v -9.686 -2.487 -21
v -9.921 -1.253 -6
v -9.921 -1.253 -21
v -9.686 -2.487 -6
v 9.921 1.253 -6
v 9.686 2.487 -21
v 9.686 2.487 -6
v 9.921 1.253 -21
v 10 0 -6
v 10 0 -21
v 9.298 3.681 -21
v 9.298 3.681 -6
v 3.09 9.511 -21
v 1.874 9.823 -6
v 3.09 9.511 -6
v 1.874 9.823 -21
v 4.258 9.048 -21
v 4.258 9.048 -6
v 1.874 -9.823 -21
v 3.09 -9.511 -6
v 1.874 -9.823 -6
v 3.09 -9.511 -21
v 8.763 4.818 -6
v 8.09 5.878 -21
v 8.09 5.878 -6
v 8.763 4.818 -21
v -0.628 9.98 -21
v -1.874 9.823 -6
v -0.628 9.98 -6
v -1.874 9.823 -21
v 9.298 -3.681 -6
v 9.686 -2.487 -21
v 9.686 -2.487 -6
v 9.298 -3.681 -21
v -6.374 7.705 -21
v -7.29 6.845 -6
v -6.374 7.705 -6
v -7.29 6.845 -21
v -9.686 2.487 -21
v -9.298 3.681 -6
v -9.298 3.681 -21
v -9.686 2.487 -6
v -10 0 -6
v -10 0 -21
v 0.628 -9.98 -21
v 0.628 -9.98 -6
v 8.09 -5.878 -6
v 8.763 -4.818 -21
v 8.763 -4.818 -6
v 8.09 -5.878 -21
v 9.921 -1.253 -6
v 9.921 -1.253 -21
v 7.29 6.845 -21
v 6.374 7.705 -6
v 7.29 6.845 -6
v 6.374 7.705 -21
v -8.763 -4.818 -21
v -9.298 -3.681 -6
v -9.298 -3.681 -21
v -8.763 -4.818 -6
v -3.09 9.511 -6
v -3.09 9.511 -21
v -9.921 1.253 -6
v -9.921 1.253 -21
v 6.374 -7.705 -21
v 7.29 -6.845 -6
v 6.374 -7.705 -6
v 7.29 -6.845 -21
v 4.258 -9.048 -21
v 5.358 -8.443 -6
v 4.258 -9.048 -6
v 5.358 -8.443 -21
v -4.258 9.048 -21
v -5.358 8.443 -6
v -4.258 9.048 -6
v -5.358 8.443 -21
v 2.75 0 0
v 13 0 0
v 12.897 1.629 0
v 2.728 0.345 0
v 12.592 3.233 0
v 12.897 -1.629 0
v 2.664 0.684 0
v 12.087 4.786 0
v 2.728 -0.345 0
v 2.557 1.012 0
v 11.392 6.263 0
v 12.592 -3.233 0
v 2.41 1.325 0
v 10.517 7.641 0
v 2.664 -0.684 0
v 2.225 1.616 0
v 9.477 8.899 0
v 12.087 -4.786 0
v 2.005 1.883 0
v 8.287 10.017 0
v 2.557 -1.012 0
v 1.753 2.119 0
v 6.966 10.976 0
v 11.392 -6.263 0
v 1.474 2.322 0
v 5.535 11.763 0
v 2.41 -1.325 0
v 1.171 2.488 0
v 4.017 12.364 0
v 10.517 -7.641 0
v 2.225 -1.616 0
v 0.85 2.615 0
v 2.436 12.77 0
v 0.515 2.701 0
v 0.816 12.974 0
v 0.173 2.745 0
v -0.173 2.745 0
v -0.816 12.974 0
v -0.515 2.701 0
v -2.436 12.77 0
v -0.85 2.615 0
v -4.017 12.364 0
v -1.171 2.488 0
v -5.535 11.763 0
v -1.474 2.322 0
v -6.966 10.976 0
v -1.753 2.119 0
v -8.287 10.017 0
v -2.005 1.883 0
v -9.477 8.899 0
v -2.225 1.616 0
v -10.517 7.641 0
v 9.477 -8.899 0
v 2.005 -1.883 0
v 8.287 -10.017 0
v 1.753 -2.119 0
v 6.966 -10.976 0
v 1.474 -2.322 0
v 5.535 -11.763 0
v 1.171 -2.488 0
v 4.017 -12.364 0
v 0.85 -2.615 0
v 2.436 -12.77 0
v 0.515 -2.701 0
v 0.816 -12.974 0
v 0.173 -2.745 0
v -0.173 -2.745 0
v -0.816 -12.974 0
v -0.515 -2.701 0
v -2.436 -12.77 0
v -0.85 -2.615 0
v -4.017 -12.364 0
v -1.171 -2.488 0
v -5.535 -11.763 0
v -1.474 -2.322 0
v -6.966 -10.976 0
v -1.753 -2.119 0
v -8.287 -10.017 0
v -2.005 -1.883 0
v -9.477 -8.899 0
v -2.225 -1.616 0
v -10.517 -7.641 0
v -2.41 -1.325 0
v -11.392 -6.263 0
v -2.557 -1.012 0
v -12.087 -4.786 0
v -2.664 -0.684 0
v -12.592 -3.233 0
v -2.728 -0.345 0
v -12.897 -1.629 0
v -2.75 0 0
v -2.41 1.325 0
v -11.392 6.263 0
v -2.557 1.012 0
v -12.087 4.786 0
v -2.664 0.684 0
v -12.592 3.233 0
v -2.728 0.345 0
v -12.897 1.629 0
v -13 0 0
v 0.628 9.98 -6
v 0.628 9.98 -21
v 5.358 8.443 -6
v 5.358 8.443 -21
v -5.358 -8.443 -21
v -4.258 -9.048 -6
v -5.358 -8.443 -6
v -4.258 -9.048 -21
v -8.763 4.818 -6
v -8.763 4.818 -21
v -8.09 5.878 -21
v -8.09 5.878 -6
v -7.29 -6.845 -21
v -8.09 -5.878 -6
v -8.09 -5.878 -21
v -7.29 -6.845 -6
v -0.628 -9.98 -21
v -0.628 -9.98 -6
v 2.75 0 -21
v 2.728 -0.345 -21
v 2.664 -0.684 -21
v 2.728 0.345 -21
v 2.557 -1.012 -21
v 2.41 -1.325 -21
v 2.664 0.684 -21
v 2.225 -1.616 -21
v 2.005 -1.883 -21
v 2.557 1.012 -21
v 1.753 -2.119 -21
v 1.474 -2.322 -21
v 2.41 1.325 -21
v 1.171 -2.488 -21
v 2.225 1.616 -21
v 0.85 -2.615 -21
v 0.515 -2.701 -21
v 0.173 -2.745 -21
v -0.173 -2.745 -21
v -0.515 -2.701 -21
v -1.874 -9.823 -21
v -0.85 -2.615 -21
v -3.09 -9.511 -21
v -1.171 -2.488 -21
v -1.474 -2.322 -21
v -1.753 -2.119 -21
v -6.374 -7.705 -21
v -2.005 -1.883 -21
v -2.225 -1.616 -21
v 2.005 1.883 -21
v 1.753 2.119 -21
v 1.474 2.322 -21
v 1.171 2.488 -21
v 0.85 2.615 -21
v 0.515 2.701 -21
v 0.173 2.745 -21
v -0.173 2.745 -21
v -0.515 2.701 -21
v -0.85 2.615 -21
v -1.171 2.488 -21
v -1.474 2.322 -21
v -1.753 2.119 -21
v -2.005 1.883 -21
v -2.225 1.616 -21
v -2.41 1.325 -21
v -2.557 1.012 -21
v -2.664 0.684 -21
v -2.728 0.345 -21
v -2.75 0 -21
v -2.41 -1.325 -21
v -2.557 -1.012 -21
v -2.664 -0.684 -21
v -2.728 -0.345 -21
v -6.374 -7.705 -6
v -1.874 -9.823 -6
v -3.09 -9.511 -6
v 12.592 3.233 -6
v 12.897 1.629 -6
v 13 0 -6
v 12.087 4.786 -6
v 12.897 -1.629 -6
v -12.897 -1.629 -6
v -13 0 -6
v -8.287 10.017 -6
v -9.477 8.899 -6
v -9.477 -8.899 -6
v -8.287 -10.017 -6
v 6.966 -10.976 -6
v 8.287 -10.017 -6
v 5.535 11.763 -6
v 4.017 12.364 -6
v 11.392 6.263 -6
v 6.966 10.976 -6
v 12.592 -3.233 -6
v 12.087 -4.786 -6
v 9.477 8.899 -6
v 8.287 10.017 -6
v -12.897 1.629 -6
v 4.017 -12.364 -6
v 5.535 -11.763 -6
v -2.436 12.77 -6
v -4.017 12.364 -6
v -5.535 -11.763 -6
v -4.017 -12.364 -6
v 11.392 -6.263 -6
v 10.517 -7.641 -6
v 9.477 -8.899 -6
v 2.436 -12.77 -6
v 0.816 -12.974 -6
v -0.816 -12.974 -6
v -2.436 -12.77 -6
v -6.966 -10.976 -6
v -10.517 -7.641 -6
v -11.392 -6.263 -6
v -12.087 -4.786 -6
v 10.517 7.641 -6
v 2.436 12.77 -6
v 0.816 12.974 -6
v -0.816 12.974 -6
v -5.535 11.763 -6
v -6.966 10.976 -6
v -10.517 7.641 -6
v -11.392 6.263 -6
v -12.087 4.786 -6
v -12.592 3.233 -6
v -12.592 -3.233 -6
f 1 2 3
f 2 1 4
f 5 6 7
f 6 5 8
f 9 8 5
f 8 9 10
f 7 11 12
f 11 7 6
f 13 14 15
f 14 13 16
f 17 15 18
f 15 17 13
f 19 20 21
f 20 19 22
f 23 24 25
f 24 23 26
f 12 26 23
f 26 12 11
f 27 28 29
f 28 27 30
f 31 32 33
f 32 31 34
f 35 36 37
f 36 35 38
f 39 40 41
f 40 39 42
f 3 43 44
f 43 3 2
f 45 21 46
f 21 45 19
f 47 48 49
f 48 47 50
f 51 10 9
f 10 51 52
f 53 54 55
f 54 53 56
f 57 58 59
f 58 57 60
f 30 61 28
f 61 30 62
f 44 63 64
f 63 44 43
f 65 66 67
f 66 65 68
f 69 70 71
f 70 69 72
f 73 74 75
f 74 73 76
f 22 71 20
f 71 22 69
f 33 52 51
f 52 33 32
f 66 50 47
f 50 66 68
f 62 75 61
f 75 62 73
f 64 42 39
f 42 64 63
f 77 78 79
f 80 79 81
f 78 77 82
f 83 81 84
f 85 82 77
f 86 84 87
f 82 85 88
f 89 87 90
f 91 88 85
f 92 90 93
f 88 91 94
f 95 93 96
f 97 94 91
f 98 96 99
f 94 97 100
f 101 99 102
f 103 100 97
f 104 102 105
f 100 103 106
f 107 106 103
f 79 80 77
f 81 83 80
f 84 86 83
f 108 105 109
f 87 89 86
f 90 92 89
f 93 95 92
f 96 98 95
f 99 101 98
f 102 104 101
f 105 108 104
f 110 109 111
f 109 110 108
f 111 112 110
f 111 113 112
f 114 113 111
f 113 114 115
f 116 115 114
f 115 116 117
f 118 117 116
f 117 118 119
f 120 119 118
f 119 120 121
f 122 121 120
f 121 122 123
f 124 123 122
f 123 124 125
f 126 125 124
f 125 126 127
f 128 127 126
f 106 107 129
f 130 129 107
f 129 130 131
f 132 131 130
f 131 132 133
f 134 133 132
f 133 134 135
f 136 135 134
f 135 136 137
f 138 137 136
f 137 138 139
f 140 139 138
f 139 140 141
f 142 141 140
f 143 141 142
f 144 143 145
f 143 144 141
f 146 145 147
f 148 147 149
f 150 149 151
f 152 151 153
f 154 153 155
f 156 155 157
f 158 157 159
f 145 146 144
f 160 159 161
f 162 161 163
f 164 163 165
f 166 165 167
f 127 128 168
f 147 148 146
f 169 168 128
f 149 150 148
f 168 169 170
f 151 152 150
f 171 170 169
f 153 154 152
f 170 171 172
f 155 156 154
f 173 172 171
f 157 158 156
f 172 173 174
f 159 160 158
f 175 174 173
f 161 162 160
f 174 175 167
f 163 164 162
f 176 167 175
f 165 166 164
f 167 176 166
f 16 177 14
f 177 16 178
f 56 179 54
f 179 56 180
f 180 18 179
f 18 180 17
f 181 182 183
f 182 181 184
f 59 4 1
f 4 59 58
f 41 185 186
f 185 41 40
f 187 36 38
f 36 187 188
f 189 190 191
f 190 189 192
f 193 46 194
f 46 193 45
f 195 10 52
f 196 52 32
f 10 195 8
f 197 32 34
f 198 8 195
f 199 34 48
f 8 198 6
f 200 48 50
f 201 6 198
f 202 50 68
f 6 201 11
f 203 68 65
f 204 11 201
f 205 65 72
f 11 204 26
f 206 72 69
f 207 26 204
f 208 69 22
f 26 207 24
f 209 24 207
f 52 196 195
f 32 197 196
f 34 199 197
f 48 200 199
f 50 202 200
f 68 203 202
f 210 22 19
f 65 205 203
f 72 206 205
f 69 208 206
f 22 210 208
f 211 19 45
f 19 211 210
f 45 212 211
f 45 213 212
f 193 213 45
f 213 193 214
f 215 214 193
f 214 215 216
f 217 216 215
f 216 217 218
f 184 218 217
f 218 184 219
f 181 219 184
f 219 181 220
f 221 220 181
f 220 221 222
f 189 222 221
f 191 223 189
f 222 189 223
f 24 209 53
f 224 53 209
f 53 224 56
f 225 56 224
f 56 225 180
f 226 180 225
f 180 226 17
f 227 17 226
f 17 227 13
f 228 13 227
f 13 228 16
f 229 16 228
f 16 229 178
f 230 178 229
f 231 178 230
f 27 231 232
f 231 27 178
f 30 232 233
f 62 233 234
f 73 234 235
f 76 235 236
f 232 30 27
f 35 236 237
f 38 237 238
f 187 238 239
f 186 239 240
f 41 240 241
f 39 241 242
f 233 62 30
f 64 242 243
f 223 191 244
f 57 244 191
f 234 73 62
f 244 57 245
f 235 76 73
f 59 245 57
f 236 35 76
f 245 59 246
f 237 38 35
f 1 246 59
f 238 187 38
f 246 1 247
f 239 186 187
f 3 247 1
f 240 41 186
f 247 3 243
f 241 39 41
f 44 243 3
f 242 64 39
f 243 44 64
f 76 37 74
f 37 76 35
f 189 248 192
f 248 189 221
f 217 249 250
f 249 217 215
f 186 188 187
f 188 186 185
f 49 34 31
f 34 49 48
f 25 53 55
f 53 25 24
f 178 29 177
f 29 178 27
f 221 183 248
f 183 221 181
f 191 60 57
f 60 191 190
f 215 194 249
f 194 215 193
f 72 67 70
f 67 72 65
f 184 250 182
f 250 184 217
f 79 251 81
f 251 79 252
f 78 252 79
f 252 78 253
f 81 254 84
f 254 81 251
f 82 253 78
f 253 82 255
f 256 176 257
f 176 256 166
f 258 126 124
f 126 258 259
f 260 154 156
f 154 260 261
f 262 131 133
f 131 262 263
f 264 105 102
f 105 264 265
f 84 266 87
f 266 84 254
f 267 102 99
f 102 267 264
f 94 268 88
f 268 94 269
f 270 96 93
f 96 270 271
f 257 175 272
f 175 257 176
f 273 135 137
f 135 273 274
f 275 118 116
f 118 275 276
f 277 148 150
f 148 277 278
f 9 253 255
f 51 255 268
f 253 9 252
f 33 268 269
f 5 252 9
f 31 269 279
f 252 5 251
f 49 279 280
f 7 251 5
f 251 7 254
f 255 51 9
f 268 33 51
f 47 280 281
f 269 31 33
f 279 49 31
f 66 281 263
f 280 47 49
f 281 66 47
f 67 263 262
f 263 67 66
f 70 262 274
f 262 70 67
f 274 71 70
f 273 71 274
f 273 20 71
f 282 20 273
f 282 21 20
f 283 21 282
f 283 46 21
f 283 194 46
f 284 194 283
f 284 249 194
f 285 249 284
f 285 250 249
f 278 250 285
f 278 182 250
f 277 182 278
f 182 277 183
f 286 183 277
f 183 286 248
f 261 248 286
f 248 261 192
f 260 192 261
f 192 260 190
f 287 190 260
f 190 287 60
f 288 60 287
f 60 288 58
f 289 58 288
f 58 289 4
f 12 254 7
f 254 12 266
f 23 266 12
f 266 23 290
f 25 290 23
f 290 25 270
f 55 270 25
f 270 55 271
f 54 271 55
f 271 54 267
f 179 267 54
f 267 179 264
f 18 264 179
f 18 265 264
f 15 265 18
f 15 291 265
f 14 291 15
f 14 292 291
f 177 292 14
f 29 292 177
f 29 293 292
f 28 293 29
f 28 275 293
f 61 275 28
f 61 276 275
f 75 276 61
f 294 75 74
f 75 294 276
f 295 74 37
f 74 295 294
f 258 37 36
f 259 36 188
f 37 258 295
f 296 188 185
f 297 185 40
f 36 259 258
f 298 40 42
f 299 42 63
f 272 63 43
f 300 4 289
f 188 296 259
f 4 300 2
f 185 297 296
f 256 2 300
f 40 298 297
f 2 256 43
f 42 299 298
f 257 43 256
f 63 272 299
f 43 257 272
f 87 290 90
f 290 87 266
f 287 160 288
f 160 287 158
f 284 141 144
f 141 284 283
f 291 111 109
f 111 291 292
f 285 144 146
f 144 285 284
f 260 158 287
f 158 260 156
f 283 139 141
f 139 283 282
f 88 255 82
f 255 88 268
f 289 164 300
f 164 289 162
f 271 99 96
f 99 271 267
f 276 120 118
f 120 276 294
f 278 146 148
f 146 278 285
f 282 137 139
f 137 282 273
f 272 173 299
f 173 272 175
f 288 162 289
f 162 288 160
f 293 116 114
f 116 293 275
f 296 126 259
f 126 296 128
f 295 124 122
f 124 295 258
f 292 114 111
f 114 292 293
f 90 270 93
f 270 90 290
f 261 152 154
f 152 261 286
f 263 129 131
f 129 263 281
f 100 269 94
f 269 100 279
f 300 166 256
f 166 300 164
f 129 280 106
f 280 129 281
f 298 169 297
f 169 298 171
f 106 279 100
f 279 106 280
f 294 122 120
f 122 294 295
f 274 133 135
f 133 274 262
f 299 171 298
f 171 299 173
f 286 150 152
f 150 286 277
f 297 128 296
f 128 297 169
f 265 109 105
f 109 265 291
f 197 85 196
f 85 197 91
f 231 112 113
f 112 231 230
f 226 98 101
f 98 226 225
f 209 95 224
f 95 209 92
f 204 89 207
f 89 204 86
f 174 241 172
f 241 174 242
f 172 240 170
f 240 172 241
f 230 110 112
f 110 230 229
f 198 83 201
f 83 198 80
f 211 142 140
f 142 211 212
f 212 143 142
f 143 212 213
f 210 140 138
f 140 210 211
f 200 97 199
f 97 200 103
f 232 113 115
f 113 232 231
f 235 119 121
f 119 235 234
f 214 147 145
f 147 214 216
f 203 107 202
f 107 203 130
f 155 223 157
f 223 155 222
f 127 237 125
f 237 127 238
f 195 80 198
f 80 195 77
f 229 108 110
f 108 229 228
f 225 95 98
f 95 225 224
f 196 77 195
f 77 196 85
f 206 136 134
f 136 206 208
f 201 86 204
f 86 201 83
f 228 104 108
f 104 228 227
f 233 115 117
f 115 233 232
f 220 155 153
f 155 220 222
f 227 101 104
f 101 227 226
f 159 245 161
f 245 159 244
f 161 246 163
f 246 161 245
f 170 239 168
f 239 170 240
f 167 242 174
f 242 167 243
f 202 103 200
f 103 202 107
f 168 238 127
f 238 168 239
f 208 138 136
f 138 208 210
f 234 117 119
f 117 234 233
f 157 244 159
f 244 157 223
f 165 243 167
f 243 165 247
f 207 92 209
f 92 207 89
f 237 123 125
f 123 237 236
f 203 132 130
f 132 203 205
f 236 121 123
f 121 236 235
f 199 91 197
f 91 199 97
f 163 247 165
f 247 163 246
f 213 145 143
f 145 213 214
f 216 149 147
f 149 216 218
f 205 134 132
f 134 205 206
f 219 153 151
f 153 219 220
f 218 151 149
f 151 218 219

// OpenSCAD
$fn = 50;


difference() {
	union() {
		translate(v = [0, 0, -21.0000000000]) {
			cylinder(h = 21, r = 10.0000000000);
		}
		translate(v = [0, 0, -6.0000000000]) {
			cylinder(h = 6, r = 13.0000000000);
		}
	}
	union() {
		#translate(v = [0, 0, -21]) {
			cylinder(h = 21, r = 2.7500000000);
		}
	}
}
